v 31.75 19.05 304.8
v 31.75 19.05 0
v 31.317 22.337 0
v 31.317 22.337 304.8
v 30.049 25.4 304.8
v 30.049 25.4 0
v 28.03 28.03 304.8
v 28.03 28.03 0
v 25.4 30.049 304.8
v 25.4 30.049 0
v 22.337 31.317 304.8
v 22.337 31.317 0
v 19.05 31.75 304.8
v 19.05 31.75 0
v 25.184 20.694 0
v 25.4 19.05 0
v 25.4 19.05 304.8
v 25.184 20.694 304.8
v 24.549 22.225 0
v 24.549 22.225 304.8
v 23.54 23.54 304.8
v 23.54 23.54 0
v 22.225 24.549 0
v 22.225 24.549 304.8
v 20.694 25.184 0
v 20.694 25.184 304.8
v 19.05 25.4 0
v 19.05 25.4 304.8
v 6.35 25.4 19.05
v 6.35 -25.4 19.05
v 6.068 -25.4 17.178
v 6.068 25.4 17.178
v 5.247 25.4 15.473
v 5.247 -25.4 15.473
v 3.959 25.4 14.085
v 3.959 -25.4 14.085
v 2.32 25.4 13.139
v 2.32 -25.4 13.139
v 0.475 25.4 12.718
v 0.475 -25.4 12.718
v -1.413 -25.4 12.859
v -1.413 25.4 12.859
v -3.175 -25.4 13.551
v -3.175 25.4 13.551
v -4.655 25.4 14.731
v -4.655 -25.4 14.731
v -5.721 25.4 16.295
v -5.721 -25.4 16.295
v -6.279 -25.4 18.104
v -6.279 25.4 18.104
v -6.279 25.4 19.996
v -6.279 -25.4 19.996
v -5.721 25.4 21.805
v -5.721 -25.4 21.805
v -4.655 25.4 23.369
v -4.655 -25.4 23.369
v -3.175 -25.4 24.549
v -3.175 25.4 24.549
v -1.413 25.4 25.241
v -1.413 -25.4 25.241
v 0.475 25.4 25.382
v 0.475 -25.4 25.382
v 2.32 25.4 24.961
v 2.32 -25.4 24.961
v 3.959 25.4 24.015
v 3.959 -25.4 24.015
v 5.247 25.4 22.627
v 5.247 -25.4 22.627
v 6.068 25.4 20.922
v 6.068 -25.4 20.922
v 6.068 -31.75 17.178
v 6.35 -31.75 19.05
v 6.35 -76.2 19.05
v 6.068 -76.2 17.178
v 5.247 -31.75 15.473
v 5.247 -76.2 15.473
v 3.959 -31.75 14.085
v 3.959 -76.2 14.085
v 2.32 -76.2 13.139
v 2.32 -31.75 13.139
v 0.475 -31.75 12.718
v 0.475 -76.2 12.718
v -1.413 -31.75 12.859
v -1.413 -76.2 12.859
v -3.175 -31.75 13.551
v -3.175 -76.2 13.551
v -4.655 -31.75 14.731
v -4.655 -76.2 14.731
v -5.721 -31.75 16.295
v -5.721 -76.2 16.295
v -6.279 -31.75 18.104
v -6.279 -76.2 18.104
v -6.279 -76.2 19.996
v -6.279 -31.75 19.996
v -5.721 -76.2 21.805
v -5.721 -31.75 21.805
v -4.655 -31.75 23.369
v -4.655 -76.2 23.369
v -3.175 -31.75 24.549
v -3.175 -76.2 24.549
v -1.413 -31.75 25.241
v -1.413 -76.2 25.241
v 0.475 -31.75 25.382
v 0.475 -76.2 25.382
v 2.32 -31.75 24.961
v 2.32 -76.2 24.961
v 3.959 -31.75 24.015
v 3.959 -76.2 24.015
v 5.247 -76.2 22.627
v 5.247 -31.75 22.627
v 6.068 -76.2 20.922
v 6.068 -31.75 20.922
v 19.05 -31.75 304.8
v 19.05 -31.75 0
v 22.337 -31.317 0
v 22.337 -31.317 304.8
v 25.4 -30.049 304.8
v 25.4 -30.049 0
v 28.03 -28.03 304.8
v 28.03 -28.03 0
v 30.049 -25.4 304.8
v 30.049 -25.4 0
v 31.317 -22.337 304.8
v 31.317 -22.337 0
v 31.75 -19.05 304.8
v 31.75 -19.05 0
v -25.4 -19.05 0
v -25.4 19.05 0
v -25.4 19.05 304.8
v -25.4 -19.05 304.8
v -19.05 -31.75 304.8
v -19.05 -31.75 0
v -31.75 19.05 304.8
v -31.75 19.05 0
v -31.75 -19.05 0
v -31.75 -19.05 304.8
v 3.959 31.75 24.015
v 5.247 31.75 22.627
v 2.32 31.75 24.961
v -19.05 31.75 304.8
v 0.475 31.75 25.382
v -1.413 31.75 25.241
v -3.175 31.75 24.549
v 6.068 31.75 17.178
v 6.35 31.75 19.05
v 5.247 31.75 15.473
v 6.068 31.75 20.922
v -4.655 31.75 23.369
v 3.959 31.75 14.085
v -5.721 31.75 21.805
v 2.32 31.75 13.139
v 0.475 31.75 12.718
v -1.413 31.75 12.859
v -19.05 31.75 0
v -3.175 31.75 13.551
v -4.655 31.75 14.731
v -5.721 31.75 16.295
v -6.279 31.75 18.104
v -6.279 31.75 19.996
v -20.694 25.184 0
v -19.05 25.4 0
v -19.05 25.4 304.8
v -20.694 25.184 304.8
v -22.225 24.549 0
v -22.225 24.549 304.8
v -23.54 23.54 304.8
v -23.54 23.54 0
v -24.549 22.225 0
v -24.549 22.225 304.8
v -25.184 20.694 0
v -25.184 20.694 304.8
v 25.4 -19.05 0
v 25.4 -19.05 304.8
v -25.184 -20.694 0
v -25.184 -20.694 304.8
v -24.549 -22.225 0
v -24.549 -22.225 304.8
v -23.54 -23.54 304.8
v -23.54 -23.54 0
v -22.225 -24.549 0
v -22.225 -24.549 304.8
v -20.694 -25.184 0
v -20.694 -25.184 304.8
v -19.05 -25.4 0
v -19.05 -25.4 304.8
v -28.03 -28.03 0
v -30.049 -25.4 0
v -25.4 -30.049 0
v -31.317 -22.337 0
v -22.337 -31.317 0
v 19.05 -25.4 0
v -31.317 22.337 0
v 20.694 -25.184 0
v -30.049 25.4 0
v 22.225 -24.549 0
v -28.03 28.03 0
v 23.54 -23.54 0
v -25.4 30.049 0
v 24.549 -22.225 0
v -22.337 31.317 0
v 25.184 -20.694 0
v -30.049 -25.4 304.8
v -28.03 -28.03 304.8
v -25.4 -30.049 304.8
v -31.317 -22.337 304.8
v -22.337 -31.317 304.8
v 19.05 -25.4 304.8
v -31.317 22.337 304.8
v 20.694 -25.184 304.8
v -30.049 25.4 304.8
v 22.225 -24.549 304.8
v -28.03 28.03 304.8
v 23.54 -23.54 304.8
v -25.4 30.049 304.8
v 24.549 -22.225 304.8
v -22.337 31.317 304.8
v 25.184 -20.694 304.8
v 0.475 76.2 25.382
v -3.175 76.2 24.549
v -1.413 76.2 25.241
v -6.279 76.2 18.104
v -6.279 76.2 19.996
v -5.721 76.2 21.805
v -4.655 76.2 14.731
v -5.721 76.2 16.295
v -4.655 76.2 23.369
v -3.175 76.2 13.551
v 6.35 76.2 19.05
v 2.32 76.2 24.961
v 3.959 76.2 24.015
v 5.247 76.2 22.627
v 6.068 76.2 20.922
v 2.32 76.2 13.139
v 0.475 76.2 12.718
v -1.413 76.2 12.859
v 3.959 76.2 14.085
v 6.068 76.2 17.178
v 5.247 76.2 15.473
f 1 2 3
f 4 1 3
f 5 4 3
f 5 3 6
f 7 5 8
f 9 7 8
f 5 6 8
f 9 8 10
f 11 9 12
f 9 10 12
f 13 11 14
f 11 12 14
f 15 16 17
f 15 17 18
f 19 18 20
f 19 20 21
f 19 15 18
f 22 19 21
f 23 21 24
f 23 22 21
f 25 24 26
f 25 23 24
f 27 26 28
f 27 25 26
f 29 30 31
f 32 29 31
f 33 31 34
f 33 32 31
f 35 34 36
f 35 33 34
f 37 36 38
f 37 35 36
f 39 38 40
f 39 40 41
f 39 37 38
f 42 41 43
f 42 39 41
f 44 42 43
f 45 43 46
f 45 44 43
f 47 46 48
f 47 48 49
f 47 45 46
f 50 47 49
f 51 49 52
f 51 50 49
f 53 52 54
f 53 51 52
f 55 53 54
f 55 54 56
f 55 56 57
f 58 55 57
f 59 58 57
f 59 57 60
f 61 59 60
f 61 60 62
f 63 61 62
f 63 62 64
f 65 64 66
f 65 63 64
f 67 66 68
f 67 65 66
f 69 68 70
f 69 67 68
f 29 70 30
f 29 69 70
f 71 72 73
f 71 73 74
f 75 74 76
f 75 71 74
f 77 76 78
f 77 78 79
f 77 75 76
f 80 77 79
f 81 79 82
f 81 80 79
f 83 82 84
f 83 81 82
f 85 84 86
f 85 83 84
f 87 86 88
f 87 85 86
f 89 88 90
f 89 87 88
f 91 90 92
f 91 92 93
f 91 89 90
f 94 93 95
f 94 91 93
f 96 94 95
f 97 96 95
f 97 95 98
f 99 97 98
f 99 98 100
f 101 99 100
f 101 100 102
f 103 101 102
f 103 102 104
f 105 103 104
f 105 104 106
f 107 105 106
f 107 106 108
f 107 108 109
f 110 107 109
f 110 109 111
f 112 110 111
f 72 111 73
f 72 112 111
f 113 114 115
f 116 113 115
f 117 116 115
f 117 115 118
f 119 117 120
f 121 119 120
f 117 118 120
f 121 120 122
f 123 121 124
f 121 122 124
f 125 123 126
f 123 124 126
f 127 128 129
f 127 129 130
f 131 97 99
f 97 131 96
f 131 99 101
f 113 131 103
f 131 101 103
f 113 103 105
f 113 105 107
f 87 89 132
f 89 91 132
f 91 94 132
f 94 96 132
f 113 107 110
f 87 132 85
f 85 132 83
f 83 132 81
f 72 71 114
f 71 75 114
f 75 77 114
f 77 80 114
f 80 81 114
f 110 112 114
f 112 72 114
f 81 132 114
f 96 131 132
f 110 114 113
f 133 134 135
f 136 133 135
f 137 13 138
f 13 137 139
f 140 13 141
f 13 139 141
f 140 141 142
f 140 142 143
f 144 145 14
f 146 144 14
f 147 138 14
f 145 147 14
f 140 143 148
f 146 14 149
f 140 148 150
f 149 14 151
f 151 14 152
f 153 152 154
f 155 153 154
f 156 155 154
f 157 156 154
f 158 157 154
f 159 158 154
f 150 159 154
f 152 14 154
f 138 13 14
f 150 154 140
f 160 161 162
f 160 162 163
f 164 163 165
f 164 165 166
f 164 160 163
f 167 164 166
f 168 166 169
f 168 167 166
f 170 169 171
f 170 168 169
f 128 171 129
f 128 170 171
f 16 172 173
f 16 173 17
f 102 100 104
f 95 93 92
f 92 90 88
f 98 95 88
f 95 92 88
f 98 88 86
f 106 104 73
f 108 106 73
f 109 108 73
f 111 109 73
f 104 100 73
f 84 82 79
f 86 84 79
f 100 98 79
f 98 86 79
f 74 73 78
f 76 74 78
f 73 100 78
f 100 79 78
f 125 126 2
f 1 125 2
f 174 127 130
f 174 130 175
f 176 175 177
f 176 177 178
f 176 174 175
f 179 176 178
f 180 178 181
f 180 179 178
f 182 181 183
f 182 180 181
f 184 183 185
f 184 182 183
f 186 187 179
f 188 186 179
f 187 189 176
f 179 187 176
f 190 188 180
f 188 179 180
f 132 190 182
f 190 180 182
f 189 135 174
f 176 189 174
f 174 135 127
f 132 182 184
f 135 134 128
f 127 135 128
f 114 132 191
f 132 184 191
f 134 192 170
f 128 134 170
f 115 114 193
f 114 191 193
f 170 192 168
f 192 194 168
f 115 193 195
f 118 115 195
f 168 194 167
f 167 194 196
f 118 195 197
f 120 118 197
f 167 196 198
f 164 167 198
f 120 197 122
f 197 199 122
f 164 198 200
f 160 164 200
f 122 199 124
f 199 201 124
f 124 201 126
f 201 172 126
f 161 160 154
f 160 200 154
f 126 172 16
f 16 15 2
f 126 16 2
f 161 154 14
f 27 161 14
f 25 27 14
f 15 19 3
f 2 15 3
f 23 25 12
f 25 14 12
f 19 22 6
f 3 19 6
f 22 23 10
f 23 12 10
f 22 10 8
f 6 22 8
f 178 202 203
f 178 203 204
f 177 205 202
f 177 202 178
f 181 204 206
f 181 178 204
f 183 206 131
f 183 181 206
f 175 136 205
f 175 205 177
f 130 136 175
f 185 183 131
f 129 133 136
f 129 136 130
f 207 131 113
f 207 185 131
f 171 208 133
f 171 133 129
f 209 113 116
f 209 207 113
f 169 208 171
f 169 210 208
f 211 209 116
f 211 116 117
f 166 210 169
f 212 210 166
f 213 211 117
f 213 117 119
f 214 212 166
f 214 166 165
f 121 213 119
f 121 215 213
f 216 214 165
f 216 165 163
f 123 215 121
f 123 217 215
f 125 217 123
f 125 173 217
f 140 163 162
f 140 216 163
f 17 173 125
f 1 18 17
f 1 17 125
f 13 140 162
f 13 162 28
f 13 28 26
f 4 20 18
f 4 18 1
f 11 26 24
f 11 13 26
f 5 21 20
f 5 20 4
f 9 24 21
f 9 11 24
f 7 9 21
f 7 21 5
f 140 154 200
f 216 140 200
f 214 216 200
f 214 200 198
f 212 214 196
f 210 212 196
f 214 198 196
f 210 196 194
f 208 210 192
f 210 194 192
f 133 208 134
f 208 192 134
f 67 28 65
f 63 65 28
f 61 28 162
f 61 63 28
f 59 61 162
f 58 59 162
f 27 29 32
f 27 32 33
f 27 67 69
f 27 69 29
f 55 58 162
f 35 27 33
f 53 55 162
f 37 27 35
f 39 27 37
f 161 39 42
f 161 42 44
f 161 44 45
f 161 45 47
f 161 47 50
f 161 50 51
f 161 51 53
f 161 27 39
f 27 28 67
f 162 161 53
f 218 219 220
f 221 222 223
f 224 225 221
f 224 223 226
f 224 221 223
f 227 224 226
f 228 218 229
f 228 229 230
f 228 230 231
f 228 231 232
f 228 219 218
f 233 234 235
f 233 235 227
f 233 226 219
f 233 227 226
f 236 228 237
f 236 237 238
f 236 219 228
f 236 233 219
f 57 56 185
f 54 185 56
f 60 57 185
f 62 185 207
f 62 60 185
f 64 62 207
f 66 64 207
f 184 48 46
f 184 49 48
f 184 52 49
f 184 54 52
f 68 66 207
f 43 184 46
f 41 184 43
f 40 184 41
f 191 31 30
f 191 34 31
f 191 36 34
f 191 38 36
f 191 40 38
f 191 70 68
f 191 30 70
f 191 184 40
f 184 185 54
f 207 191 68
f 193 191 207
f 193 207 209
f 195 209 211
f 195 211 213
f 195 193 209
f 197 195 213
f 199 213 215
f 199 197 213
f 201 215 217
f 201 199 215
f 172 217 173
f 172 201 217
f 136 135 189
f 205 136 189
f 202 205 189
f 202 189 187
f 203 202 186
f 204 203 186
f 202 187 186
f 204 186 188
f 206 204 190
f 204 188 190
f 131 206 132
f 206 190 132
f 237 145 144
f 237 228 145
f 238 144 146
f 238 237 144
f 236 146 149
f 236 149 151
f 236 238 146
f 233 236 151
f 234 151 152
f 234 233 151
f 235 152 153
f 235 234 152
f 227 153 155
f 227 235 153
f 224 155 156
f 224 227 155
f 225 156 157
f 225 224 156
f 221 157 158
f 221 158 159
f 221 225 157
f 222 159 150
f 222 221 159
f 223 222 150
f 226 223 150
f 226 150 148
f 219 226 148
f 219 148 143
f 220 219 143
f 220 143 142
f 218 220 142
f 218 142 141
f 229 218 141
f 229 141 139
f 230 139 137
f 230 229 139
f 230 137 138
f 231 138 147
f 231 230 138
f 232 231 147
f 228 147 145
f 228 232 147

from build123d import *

# Parameters (mm, degrees)
BOSS_EXTRUDE1_DEPTH = 304.8
SKETCH3_R           = 6.35
BOSS_EXTRUDE2_DEPTH = 76.2


with BuildPart() as part:
    # Sketch1 → Boss-Extrude1 (new body)
    with BuildSketch(Plane.XY):
        with BuildLine():
            Line((19.05, 31.75), (-19.05, 31.75))
            ThreePointArc((-19.05, 31.75), (-28.030256121, 28.030256121), (-31.75, 19.05))
            Line((-31.75, 19.05), (-31.75, -19.05))
            ThreePointArc((-31.75, -19.05), (-28.030256121, -28.030256121), (-19.05, -31.75))
            Line((-19.05, -31.75), (19.05, -31.75))
            ThreePointArc((19.05, -31.75), (28.030256121, -28.030256121), (31.75, -19.05))
            Line((31.75, -19.05), (31.75, 19.05))
            ThreePointArc((31.75, 19.05), (28.030256121, 28.030256121), (19.05, 31.75))
        make_face()
        with BuildLine():
            ThreePointArc((-25.4, -19.05), (-23.540128061, -23.540128061), (-19.05, -25.4))
            Line((-19.05, -25.4), (19.05, -25.4))
            ThreePointArc((19.05, -25.4), (23.540128061, -23.540128061), (25.4, -19.05))
            Line((25.4, -19.05), (25.4, 19.05))
            ThreePointArc((25.4, 19.05), (23.540128061, 23.540128061), (19.05, 25.4))
            Line((19.05, 25.4), (-19.05, 25.4))
            ThreePointArc((-19.05, 25.4), (-23.540128061, 23.540128061), (-25.4, 19.05))
            Line((-25.4, 19.05), (-25.4, -19.05))
        make_face(mode=Mode.SUBTRACT)
    extrude(amount=BOSS_EXTRUDE1_DEPTH)

    # Sketch3 → Boss-Extrude2 (add, symmetric)
    with BuildSketch(Plane(origin=(0, 0, 0), x_dir=(1, 0, 0), z_dir=(0, 1, 0))):
        with Locations((0, -19.05)):
            Circle(SKETCH3_R)
    extrude(amount=BOSS_EXTRUDE2_DEPTH, both=True)


solid = part.part
